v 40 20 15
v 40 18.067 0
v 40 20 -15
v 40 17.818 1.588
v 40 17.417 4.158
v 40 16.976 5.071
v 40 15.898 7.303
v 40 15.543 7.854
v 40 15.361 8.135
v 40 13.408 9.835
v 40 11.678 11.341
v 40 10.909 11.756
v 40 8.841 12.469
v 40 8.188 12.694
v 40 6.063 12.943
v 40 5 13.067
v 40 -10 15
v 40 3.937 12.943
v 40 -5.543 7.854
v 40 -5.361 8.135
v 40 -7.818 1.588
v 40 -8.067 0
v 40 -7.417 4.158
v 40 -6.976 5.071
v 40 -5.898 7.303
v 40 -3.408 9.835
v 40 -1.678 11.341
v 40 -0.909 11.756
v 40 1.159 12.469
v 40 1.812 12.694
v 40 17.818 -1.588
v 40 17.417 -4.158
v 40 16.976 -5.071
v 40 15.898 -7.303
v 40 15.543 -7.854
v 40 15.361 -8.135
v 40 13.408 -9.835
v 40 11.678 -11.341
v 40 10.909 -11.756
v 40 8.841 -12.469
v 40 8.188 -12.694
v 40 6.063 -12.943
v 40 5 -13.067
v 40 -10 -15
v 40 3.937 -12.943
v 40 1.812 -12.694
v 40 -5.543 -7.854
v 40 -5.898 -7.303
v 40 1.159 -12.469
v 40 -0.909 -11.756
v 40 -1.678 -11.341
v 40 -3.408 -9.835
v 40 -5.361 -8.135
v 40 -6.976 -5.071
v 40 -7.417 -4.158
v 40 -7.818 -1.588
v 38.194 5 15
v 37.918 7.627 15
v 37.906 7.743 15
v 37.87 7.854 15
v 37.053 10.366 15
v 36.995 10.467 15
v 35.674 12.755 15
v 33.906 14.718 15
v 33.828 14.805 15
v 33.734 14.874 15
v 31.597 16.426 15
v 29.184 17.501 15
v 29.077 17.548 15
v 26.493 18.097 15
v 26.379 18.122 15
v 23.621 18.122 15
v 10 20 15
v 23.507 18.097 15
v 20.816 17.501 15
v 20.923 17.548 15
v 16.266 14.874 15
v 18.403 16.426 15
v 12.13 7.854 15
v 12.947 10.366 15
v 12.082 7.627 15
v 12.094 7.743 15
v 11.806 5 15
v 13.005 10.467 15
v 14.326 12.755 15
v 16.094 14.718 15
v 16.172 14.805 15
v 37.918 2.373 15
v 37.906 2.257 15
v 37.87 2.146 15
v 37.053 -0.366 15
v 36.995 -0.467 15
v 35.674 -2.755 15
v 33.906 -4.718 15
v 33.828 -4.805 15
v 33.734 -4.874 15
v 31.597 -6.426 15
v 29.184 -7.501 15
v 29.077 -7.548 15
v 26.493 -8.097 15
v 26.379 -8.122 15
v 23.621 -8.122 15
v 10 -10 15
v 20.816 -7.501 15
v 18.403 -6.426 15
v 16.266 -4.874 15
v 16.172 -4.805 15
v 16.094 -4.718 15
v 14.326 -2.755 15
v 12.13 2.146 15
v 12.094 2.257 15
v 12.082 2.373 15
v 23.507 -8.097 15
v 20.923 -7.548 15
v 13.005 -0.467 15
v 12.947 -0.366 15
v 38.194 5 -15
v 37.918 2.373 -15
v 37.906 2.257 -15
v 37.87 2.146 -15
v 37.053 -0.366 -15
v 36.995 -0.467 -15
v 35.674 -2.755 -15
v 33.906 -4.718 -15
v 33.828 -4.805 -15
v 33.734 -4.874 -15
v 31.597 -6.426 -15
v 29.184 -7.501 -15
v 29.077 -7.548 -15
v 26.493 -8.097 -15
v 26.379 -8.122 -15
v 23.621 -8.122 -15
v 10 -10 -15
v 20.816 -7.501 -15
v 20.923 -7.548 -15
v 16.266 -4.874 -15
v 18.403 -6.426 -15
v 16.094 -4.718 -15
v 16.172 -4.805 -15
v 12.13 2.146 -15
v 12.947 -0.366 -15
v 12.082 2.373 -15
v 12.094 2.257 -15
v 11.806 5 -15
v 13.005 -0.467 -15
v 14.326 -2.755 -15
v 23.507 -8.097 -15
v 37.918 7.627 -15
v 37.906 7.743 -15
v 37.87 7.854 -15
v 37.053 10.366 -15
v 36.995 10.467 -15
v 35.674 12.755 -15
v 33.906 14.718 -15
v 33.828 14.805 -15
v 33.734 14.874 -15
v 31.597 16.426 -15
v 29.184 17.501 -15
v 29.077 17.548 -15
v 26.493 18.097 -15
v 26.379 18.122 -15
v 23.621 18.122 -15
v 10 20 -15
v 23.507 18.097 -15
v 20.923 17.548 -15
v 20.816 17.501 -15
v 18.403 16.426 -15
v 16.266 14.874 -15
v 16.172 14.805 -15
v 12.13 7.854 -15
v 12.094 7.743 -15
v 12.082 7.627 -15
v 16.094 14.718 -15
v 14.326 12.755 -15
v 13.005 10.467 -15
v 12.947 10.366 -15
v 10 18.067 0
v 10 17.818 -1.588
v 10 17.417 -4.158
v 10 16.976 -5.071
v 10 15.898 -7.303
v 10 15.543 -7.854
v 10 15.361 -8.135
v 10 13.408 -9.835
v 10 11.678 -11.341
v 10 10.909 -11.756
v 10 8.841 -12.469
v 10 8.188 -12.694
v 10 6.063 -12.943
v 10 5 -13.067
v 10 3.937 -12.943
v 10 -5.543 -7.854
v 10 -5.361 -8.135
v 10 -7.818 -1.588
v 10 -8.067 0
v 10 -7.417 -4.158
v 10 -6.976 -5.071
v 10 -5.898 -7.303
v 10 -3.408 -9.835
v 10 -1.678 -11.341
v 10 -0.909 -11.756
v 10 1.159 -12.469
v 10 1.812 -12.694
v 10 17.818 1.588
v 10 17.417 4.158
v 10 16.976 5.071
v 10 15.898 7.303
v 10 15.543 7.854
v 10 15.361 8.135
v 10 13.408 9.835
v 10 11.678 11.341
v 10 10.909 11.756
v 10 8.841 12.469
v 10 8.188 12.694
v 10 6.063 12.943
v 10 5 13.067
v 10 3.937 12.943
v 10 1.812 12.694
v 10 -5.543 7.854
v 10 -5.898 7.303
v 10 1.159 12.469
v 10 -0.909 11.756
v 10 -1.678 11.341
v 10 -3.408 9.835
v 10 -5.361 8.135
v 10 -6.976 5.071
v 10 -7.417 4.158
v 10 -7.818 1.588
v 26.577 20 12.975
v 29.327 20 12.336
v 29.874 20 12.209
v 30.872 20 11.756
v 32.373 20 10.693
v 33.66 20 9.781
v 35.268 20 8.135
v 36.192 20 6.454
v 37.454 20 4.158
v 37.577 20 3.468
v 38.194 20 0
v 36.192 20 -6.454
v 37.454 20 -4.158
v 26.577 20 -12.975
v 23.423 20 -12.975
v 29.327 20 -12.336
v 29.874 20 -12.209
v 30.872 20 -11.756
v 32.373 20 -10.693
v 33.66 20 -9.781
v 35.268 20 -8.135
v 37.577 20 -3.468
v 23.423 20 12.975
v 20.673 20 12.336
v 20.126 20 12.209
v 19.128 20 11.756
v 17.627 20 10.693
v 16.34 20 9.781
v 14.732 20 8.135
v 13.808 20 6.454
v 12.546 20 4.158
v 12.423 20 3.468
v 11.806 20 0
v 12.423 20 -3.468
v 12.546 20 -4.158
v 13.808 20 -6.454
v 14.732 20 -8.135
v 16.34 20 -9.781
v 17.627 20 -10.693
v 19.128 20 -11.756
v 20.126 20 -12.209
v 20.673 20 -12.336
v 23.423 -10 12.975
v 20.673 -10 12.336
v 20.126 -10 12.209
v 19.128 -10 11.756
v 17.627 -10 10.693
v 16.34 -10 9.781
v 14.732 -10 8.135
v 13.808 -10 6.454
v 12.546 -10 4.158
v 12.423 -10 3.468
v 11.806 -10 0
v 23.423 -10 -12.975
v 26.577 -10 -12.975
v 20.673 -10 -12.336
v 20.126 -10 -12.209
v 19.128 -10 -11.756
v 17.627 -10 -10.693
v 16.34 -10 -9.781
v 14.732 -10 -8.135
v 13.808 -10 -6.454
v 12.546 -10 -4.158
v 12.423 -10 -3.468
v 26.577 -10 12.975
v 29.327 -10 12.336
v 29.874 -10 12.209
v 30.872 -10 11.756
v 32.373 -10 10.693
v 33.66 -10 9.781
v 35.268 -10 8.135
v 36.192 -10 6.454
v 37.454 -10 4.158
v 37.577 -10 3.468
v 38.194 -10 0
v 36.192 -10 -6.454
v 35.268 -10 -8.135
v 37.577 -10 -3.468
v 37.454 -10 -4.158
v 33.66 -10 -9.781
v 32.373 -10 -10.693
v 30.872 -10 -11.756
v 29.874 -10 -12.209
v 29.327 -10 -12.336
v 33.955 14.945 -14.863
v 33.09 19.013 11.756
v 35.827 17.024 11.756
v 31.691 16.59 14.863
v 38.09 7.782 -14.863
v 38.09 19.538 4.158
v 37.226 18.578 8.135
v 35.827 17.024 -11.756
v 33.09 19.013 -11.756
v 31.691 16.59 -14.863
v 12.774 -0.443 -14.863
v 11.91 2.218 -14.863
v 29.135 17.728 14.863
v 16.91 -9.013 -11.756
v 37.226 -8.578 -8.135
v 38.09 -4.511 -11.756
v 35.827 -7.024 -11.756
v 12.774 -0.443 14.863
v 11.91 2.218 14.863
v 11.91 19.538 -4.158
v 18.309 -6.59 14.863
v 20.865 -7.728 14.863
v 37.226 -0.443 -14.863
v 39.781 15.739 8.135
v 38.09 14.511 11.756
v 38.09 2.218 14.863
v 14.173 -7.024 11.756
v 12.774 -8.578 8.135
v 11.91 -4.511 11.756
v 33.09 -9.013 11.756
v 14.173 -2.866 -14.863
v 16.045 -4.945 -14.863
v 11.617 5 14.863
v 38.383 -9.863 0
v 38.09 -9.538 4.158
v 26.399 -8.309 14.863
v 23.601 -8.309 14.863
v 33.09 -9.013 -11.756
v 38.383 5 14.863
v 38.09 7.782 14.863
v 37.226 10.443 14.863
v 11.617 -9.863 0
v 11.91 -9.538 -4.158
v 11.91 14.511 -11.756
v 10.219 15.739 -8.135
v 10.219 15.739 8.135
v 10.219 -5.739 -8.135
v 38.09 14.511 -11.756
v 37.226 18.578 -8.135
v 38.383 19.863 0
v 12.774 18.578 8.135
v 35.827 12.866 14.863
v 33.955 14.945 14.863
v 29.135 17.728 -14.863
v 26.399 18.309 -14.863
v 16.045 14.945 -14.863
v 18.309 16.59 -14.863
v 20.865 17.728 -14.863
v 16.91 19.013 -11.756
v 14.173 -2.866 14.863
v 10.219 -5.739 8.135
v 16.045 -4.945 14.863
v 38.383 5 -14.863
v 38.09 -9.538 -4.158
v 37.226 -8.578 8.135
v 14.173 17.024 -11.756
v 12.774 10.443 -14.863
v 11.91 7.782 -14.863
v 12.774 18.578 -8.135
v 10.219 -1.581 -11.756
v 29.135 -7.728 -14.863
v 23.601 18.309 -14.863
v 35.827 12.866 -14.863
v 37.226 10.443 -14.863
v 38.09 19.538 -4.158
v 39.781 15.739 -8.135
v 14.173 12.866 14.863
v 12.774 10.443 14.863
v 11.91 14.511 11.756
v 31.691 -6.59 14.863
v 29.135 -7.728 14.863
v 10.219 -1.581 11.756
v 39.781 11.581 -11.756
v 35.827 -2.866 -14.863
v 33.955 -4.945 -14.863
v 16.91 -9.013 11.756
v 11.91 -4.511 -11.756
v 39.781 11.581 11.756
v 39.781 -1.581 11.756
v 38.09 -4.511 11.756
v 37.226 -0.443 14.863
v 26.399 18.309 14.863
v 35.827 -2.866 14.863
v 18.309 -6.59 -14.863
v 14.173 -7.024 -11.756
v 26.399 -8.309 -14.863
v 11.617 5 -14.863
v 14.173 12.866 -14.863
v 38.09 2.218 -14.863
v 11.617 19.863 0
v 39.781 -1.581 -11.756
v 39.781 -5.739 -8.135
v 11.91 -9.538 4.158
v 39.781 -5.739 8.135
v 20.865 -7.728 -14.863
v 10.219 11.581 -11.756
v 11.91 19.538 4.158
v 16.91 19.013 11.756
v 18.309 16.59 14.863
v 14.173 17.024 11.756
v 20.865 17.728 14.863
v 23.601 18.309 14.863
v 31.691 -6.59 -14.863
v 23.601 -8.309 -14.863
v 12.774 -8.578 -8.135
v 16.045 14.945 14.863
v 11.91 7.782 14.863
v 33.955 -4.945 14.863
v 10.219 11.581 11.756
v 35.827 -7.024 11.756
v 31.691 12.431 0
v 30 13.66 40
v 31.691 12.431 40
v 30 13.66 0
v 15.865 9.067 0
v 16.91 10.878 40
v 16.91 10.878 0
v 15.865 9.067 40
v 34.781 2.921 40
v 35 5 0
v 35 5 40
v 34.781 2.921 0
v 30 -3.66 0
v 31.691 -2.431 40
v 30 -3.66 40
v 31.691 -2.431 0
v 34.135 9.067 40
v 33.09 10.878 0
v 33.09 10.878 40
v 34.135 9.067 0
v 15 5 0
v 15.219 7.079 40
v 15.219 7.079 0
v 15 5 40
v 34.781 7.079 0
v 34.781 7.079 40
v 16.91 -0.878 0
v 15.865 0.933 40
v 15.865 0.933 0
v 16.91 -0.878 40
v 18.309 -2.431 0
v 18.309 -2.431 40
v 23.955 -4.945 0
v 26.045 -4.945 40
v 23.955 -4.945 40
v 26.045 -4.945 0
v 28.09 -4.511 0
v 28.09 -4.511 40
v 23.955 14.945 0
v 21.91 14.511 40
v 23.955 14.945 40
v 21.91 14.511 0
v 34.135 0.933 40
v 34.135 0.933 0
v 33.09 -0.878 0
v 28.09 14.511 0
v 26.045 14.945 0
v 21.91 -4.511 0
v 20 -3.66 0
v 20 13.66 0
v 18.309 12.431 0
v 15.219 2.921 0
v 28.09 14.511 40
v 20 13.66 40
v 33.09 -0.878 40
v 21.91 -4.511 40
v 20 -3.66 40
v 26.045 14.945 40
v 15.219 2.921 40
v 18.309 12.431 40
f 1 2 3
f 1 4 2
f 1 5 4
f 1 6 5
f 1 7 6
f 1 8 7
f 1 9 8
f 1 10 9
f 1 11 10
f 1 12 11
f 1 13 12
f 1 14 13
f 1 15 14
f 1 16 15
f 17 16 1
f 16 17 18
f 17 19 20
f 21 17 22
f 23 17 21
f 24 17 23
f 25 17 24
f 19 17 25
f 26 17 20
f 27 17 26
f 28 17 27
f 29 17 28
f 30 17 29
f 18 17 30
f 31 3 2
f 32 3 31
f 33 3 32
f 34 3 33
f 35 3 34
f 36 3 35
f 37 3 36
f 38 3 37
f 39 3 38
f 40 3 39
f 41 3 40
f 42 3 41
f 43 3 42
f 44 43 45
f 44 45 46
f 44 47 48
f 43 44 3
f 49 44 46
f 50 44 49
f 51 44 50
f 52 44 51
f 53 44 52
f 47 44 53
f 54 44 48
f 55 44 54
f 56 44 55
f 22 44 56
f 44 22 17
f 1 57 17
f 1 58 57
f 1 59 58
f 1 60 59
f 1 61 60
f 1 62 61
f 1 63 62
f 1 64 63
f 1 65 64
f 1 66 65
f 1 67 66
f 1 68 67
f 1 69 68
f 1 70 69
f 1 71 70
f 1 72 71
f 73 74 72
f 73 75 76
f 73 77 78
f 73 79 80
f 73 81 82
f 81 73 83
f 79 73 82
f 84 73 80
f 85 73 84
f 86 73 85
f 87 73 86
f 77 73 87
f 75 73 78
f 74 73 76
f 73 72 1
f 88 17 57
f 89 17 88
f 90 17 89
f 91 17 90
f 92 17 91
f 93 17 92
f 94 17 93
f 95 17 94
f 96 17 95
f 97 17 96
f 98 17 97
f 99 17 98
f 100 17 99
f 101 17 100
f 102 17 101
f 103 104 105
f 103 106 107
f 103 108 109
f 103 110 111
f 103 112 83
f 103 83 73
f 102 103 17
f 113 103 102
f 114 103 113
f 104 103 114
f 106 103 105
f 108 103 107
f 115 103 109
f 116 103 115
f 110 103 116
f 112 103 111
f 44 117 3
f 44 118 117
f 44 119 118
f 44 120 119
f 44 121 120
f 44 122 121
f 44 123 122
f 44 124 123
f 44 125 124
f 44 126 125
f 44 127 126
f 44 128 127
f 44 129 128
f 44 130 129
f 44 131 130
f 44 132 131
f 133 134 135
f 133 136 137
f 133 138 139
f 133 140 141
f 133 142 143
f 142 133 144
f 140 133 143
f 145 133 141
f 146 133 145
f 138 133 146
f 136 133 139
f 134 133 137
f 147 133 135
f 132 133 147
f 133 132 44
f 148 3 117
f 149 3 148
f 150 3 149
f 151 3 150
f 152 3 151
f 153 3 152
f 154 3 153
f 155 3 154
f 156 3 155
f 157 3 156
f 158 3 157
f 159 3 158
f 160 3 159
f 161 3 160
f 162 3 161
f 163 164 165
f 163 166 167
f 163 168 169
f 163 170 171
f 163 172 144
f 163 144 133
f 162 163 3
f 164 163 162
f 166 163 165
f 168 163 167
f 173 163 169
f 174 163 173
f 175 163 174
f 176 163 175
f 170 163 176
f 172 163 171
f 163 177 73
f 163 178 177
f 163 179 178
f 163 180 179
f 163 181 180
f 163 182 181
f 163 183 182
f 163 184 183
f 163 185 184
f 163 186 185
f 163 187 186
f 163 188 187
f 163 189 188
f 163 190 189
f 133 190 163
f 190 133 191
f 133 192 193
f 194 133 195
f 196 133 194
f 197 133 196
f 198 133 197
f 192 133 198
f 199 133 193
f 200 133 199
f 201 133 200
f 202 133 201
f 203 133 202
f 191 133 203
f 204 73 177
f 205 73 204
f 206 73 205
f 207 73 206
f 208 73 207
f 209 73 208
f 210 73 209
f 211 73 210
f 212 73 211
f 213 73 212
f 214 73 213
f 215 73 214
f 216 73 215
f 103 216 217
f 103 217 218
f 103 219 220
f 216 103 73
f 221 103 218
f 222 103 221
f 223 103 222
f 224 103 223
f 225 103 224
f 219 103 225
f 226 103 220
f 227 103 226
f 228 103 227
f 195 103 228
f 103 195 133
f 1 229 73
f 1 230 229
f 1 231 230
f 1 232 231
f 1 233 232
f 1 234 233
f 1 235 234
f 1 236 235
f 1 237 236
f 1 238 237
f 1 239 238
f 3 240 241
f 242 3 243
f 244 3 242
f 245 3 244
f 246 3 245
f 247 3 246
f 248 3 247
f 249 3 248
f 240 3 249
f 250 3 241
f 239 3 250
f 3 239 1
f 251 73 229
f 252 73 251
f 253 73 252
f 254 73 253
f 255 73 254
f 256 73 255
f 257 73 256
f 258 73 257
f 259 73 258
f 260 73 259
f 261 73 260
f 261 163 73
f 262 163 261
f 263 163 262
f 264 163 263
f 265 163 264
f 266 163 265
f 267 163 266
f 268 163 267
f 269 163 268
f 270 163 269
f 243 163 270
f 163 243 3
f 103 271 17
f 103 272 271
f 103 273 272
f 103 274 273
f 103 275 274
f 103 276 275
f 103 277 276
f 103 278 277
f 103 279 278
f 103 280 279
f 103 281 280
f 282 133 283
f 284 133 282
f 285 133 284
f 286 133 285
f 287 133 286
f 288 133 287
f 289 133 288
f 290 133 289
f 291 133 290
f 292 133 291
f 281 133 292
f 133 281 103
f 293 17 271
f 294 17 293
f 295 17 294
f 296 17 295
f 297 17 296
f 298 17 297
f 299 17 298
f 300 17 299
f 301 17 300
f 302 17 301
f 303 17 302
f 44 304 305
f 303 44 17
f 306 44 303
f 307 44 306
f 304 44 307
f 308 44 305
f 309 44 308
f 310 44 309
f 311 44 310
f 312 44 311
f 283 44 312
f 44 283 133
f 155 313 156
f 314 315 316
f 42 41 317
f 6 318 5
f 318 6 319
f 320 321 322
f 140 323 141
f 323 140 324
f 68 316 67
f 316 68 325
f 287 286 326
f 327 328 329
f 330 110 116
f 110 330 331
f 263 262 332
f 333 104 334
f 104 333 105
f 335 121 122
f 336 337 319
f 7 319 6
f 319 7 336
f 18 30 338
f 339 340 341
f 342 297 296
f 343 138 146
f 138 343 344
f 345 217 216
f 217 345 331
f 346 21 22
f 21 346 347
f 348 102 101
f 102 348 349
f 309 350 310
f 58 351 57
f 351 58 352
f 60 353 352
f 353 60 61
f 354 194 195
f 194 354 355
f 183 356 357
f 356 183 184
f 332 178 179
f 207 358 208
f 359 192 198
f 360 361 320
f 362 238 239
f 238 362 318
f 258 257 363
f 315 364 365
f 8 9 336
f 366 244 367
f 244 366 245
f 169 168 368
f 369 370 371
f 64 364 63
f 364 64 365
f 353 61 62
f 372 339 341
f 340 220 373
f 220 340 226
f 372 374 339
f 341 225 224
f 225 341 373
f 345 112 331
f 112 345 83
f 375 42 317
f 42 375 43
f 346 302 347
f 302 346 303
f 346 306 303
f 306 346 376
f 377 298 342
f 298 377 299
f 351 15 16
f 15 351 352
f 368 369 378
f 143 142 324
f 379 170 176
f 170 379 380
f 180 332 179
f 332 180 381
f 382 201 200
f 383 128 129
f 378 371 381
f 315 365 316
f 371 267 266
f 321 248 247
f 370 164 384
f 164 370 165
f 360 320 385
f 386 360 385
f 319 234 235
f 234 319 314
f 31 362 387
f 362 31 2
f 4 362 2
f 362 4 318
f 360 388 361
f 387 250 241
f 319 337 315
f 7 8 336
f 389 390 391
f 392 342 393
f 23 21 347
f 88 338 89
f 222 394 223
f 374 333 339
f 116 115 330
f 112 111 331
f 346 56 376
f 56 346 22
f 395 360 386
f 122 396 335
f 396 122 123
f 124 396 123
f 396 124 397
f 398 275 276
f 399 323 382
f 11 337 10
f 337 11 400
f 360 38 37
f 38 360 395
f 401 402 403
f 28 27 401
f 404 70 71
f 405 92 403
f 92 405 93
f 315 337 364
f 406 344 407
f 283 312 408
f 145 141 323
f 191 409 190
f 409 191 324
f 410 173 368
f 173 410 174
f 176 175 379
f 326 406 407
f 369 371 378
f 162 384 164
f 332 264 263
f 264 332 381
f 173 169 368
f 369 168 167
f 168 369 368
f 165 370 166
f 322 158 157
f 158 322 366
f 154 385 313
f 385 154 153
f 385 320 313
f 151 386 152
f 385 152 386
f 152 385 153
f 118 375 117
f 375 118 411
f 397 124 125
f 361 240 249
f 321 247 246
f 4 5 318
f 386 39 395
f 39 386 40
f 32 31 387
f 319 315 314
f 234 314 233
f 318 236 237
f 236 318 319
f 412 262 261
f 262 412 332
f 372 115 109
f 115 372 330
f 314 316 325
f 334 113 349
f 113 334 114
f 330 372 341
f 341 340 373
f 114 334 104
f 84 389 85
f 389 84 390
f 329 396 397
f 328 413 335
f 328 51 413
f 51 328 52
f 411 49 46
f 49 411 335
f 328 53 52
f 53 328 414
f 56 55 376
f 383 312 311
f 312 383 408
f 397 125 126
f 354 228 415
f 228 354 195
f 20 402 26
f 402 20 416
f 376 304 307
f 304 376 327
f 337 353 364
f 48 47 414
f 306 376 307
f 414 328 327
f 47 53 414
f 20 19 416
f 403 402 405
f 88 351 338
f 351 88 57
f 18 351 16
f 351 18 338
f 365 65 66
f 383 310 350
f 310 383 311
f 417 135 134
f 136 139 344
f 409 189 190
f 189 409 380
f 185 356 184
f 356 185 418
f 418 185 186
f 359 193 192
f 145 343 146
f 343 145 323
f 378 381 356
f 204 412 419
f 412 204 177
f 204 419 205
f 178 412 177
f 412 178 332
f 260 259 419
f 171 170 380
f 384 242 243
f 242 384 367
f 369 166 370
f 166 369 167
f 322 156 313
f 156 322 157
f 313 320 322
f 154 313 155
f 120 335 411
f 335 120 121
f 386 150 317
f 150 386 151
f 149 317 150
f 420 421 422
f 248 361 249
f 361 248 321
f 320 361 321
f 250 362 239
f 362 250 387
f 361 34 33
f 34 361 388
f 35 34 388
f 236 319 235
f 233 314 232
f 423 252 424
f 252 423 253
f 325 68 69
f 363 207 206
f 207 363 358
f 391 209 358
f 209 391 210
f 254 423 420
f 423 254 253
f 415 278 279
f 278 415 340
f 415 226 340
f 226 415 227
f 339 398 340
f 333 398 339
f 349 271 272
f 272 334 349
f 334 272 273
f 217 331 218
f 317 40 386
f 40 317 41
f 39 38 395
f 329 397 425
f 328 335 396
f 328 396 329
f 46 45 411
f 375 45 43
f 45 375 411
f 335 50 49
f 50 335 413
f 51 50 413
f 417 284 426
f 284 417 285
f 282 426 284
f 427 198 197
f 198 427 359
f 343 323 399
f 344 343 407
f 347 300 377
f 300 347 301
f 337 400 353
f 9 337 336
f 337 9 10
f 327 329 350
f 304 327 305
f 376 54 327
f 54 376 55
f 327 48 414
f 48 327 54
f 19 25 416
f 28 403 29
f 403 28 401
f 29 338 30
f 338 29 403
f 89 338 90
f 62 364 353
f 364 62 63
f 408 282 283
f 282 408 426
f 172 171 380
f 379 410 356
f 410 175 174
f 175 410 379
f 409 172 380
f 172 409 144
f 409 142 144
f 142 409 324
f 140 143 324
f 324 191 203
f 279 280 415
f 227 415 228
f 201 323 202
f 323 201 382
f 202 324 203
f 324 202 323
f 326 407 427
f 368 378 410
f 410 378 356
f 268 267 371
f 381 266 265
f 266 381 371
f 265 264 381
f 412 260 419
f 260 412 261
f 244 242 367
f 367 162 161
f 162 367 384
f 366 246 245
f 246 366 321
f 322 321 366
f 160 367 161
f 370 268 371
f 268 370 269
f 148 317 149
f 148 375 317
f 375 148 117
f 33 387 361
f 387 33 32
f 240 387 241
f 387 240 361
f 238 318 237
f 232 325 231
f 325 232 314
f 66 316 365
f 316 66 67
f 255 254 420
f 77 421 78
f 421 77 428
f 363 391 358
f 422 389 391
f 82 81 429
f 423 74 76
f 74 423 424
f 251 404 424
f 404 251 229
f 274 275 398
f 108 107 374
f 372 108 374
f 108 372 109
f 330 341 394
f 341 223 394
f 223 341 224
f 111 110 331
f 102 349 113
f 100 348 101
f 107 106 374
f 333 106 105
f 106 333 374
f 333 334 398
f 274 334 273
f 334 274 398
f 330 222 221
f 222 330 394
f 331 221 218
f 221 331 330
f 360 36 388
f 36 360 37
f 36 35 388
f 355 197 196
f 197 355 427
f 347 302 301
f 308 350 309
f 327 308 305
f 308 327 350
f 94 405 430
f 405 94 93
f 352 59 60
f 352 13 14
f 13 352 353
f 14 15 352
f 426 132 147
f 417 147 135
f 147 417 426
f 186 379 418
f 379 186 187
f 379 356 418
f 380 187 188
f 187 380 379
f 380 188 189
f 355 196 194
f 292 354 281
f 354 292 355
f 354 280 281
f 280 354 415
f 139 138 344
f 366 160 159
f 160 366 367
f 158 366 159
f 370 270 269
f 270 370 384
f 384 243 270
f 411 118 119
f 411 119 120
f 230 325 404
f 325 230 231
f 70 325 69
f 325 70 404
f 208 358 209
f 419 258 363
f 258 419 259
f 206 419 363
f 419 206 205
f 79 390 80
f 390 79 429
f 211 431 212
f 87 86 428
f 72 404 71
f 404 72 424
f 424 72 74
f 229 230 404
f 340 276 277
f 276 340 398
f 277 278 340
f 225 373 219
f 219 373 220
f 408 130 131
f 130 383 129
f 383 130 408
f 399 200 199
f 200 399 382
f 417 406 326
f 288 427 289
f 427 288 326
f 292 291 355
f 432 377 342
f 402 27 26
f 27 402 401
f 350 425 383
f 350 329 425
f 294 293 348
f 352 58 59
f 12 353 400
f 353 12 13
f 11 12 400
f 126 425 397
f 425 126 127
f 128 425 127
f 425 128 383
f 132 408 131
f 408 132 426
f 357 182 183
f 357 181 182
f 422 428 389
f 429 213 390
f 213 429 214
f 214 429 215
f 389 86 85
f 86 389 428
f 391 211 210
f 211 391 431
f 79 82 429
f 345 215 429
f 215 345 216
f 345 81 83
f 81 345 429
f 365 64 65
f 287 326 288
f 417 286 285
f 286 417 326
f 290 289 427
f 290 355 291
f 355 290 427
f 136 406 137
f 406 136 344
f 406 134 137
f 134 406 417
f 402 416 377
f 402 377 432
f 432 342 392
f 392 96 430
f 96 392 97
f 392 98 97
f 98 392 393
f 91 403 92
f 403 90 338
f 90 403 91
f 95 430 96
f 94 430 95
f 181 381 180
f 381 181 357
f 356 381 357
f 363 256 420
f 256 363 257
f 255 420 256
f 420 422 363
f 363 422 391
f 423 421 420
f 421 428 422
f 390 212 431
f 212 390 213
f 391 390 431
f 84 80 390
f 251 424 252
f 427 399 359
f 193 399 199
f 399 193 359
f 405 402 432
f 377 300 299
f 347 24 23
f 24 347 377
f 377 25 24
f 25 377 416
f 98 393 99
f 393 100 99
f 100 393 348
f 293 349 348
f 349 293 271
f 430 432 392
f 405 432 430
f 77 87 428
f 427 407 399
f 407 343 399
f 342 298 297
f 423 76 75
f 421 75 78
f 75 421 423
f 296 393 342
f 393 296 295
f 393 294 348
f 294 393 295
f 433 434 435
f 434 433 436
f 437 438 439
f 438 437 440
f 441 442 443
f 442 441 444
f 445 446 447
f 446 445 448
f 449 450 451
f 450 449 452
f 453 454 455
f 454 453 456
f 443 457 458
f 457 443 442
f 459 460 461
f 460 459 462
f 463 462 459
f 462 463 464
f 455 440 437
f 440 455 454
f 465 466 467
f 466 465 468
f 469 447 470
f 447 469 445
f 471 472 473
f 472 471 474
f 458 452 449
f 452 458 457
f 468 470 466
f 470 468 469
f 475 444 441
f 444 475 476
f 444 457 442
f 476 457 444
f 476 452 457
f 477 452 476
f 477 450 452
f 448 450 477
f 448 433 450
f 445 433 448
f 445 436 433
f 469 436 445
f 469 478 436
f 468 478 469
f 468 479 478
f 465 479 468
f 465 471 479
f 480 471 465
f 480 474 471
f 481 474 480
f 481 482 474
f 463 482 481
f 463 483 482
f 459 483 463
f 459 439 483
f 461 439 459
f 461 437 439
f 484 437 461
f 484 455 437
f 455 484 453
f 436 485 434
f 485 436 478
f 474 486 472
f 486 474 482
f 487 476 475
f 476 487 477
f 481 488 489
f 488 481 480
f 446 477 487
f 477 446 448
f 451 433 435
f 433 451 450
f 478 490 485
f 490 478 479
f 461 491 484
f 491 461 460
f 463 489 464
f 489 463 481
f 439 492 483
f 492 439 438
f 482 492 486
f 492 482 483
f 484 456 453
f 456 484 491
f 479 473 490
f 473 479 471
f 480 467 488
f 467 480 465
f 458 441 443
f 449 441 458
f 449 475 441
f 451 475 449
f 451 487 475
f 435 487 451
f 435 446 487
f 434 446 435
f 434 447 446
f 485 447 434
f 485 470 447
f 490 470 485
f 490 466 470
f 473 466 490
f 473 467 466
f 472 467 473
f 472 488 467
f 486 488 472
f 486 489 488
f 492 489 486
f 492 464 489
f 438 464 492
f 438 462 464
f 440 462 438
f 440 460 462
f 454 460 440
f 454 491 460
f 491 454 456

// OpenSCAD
translation_d = [25, 5, 0];
translate(translation_d) {
    
    difference() {
        
        cube(30, center=true);
        sphere(20);
    }
    cylinder(h=40, r=10);
}
